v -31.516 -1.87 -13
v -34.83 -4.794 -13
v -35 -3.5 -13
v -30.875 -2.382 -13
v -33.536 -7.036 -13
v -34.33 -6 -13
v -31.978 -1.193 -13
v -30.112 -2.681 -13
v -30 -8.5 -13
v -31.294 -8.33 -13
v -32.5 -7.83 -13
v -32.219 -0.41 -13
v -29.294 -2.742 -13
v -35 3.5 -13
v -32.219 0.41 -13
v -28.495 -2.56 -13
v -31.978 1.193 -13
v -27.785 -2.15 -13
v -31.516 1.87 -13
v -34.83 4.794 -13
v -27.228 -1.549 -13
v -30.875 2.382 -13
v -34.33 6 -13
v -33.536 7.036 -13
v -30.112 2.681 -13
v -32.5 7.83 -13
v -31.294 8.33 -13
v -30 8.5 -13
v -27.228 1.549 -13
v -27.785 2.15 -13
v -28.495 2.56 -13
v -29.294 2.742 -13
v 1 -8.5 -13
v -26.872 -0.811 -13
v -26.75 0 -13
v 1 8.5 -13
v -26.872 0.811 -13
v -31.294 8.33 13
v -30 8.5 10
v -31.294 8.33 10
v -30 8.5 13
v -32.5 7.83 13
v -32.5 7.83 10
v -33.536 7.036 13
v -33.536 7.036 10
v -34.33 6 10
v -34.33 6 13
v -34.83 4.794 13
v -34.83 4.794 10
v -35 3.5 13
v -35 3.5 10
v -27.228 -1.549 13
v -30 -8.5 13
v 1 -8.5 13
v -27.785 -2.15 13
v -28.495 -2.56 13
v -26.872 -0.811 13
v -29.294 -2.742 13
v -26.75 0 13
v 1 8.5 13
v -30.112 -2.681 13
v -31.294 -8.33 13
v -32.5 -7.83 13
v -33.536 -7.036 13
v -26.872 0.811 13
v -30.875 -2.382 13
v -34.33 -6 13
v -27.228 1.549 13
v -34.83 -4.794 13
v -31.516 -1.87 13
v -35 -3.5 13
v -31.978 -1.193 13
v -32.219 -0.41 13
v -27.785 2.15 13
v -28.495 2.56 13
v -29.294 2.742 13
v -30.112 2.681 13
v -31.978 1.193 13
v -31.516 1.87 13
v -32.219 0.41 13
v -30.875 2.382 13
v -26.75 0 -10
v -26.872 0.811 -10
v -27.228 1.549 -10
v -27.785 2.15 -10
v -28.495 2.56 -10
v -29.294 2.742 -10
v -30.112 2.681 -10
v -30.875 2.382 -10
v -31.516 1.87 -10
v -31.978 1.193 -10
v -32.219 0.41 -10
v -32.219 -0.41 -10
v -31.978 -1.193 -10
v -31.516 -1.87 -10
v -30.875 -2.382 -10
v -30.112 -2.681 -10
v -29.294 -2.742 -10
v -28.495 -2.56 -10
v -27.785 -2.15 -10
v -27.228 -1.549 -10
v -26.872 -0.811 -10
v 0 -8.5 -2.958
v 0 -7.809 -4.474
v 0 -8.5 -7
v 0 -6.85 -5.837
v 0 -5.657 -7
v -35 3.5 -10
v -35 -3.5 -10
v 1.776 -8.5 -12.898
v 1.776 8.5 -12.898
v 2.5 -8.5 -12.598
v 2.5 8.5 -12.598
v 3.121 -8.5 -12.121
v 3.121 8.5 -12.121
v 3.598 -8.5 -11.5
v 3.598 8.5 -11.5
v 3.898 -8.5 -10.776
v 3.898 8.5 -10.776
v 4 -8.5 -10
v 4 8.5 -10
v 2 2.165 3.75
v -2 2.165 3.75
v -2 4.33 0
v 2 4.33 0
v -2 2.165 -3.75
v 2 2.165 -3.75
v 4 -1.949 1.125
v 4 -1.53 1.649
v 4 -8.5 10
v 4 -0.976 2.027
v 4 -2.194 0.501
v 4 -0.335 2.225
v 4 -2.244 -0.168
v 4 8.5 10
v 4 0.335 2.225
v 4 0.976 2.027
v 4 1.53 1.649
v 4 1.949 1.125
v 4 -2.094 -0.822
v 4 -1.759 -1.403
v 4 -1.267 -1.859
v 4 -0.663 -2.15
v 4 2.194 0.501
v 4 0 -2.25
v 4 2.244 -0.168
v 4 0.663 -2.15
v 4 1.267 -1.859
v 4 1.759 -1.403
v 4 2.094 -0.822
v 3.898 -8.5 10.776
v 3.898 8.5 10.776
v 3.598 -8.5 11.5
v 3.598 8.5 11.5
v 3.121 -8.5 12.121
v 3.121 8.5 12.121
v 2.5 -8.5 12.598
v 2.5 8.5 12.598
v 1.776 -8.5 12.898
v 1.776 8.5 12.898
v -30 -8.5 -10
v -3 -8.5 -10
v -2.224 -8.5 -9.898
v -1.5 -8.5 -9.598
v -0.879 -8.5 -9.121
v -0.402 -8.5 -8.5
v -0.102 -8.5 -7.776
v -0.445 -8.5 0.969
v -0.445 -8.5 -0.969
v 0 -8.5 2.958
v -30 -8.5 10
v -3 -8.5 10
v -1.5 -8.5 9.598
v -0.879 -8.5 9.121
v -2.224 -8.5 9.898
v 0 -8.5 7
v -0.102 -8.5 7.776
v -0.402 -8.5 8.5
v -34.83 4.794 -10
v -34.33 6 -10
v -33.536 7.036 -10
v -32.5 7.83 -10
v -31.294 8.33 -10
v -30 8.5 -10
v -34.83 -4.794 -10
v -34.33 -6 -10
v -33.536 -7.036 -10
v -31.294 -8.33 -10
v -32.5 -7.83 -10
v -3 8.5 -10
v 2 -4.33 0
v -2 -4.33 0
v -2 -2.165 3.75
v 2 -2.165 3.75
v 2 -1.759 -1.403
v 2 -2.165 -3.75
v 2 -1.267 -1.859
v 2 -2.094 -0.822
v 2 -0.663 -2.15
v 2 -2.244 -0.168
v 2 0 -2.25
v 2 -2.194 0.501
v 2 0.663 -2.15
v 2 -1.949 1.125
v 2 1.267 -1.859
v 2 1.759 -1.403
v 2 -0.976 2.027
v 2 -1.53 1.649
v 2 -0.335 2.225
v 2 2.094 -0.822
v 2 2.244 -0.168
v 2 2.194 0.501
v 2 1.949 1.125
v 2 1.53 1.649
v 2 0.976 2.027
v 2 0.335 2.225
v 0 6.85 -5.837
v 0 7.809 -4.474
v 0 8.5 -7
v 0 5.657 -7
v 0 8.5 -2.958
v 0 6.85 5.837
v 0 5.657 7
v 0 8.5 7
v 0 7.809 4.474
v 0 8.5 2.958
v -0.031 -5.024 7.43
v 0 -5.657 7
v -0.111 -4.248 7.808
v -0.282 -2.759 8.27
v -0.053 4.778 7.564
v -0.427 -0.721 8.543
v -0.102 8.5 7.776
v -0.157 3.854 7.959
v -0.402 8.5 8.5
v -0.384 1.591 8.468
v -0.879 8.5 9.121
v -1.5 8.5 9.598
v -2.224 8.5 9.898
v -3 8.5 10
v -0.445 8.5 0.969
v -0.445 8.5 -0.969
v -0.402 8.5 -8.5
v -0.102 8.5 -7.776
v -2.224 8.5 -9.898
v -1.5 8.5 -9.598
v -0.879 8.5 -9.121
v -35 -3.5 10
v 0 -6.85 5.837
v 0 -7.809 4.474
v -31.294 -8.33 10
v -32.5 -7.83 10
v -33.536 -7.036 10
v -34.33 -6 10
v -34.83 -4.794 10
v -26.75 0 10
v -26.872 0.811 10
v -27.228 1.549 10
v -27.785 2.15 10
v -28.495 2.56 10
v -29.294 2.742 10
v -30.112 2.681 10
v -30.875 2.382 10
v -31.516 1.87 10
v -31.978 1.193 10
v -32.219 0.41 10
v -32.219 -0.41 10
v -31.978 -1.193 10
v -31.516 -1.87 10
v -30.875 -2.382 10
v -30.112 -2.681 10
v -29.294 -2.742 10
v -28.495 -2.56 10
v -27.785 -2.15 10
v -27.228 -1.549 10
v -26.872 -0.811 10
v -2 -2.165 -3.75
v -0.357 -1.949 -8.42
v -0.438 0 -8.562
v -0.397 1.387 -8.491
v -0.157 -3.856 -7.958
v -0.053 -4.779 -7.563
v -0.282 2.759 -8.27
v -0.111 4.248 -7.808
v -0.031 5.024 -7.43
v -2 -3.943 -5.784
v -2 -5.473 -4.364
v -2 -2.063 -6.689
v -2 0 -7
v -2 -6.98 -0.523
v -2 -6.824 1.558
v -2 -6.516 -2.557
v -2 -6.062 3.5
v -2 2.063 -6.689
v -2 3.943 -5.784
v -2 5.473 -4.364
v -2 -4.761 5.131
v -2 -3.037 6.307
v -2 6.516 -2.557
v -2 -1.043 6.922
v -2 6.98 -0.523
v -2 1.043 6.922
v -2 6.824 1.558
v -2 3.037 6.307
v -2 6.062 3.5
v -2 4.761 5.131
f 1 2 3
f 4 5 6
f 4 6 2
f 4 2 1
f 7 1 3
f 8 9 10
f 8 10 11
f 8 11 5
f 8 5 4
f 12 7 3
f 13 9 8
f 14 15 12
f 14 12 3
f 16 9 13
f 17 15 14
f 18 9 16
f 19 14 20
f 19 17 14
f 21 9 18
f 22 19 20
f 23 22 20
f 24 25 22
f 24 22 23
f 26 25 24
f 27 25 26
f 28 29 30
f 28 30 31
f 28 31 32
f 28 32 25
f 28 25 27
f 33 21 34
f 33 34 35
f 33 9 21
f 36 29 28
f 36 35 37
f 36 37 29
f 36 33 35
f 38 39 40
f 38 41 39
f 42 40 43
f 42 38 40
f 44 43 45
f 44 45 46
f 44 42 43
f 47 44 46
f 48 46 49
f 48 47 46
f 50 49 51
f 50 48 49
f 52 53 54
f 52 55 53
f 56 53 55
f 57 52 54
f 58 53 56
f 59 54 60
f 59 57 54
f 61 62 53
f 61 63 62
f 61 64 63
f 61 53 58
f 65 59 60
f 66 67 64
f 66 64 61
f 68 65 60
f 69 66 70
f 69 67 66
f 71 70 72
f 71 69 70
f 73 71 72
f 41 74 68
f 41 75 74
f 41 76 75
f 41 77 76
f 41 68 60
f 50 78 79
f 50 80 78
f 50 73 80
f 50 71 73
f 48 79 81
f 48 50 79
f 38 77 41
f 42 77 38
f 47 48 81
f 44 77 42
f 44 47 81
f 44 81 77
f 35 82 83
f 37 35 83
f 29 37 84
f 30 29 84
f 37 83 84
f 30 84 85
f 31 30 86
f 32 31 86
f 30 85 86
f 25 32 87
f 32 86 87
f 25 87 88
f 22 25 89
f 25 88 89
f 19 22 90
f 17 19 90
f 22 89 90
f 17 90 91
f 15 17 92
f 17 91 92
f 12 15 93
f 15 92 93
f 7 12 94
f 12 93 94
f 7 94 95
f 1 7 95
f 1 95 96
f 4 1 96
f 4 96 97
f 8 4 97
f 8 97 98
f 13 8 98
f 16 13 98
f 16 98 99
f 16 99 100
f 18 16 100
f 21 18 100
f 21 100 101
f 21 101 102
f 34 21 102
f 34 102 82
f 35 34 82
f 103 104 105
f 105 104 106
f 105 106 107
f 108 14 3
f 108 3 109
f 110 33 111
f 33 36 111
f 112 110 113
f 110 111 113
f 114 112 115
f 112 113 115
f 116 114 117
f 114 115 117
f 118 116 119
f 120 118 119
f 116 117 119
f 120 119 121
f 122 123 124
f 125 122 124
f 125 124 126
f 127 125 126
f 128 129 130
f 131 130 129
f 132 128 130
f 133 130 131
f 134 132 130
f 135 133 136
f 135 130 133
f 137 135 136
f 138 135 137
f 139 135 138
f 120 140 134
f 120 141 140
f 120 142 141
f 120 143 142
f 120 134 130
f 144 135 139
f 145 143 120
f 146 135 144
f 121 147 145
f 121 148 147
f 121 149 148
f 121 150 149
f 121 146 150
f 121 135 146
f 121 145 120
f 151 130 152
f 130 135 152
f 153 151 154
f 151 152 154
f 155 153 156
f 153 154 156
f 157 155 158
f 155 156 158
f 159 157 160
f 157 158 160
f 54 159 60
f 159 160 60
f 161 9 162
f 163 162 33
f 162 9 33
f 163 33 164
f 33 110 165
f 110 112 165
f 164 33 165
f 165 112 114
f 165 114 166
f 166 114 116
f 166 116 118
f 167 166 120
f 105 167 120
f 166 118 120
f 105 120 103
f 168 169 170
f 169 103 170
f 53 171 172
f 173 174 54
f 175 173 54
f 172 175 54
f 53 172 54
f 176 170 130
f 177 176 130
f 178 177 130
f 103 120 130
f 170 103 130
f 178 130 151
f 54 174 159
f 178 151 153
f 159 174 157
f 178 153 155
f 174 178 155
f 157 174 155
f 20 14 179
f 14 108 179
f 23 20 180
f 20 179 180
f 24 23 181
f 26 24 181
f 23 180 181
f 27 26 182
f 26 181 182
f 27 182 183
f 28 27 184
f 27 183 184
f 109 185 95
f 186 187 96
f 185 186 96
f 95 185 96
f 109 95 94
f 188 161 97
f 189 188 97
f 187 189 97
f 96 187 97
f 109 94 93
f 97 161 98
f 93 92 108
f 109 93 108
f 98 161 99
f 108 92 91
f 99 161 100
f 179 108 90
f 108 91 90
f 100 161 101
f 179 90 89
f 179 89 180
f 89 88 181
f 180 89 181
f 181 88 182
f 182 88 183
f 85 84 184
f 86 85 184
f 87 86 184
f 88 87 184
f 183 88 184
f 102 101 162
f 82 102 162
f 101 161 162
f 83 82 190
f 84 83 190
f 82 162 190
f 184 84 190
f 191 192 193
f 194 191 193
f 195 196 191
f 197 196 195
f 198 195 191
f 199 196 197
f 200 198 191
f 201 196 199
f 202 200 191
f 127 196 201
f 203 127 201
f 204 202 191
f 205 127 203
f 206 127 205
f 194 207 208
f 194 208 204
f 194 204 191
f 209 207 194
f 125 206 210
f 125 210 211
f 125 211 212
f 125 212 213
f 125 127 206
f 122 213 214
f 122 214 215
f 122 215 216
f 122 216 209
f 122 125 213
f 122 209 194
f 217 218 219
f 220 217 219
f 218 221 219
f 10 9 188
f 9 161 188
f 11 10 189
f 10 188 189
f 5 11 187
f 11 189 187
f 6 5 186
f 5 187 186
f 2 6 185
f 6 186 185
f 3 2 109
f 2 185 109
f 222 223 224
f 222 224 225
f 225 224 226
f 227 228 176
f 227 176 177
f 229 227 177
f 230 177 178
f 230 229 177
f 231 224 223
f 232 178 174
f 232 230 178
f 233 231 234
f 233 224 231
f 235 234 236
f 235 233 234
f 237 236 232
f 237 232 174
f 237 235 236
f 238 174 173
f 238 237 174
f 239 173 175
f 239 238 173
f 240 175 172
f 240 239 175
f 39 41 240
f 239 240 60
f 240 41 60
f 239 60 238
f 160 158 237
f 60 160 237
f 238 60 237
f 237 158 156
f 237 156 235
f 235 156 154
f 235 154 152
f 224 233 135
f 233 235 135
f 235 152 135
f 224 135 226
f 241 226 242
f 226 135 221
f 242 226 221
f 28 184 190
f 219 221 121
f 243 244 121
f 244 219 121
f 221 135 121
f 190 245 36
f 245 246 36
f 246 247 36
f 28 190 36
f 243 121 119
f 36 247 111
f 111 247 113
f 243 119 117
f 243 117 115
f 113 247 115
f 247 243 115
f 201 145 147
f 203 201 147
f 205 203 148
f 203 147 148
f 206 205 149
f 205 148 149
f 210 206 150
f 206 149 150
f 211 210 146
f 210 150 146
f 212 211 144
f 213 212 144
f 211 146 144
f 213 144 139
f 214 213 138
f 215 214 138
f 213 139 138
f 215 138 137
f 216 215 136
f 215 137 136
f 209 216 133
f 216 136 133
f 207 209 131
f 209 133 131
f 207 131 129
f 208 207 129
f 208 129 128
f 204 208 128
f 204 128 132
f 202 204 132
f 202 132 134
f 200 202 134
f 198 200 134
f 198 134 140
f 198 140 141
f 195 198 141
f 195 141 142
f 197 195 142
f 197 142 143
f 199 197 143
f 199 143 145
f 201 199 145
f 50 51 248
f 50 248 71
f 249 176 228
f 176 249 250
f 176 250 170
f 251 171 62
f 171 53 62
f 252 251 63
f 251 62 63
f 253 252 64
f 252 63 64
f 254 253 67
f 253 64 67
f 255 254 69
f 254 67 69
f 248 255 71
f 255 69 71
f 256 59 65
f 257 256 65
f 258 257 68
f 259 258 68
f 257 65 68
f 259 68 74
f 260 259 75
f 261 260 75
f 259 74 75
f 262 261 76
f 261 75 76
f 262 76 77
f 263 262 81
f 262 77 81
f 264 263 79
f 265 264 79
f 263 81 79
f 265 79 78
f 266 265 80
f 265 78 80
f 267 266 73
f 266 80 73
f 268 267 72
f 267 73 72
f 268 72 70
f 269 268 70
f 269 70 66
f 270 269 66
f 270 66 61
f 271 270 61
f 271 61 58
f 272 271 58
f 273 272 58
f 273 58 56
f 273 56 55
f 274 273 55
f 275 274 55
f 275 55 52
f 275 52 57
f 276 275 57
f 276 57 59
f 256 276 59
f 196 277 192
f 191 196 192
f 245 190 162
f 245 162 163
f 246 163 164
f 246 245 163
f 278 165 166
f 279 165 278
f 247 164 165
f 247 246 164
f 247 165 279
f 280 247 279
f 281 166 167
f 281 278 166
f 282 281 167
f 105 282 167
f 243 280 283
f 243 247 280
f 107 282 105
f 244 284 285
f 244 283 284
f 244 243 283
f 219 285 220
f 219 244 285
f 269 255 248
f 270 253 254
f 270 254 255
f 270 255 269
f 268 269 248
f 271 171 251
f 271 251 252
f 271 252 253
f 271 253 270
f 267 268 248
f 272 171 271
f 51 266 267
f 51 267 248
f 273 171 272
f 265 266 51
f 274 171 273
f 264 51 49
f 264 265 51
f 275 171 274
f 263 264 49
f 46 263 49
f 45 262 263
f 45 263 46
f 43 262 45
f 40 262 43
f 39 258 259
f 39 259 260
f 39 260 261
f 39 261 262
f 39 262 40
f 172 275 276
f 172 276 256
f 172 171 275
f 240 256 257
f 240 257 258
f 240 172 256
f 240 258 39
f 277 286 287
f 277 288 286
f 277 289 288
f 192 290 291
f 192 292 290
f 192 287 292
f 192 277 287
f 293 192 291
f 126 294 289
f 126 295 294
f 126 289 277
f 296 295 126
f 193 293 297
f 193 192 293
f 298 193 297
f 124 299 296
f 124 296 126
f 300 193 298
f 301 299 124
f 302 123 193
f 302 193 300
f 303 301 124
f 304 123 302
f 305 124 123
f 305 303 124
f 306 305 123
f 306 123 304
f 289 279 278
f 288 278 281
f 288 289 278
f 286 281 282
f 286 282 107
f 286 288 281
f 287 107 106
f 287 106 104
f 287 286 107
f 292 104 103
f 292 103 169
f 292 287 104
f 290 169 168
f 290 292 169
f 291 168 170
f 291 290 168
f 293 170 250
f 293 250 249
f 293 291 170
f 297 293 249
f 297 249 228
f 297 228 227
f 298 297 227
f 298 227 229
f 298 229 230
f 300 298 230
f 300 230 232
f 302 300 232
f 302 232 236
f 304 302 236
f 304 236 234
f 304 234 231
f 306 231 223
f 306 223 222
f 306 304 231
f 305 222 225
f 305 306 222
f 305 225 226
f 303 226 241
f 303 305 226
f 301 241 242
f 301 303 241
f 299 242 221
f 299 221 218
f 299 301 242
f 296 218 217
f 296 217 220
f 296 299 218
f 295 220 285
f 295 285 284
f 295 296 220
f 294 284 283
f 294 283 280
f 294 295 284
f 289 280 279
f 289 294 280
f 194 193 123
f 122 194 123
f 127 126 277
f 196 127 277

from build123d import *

# Parameters (mm, degrees)
SKETCH1_W           = 26
SKETCH1_H           = 17
BOSS_EXTRUDE1_DEPTH = 4
SKETCH2_W           = 3
SKETCH2_H           = 17
BOSS_EXTRUDE2_DEPTH = 35
SKETCH3_R           = 2.75
CUT_EXTRUDE1_DEPTH  = 45.421278685
FILLET1_R           = 3
FILLET2_R           = 5
SKETCH5_R           = 7
BOSS_EXTRUDE3_DEPTH = 2
CUT_EXTRUDE3_REACH  = 43.979
SKETCH7_R           = 2.25
CUT_EXTRUDE4_DEPTH  = 4
CHAMFER1_SIZE       = 2


with BuildPart() as part:
    # Sketch1 → Boss-Extrude1 (new body)
    with BuildSketch(Plane(origin=(0, 0, 0), x_dir=(0, 0, -1), z_dir=(1, 0, 0))):
        Rectangle(SKETCH1_W, SKETCH1_H)
    extrude(amount=BOSS_EXTRUDE1_DEPTH)

    # Sketch2 → Boss-Extrude2 (add)
    with BuildSketch(Plane.ZY):
        with Locations((-11.5, 0)):
            Rectangle(SKETCH2_W, SKETCH2_H)
        with Locations((11.5, 0)):
            Rectangle(SKETCH2_W, SKETCH2_H)
    extrude(amount=BOSS_EXTRUDE2_DEPTH)

    # Sketch3 → Cut-Extrude1 (cut, through all)
    with BuildSketch(Plane.XY.offset(13)):
        with Locations((-29.5, 0)):
            Circle(SKETCH3_R)
    extrude(amount=-CUT_EXTRUDE1_DEPTH, mode=Mode.SUBTRACT)

    # Fillet1
    fillet1_edges = [part.edges().sort_by_distance(p)[0] for p in [
        (4, 0, 13),
        (0, 0, -10),
        (0, 0, 10),
        (4, 0, -13),
    ]]
    fillet(fillet1_edges, radius=FILLET1_R)

    # Fillet2
    fillet2_edges = [part.edges().sort_by_distance(p)[0] for p in [
        (-35, -8.5, -11.5),
        (-35, 8.5, -11.5),
        (-35, 8.5, 11.5),
        (-35, -8.5, 11.5),
    ]]
    fillet(fillet2_edges, radius=FILLET2_R)

    # Sketch5 → Boss-Extrude3 (add)
    with BuildSketch(Plane.ZY):
        Circle(SKETCH5_R)
    extrude(amount=BOSS_EXTRUDE3_DEPTH)

    # Sketch7 → Cut-Extrude3 (cut, up to next)
    with BuildSketch(Plane(origin=(4, 0, 0), x_dir=(0, 0, -1), z_dir=(1, 0, 0)), mode=Mode.PRIVATE) as cut_extrude3_sk1:
        Circle(SKETCH7_R)
    cut_extrude3_tool1 = extrude(cut_extrude3_sk1.sketch, amount=-CUT_EXTRUDE3_REACH, mode=Mode.PRIVATE) & part.part
    add(cut_extrude3_tool1.solids().sort_by_distance((4, 0, 0))[0], mode=Mode.SUBTRACT)

    # Sketch8 → Cut-Extrude4 (cut)
    with BuildSketch(Plane.ZY.offset(2)):
        Polygon((0, 4.330127019), (-3.75, 2.165063509), (-3.75, -2.165063509), (0, -4.330127019), (3.75, -2.165063509), (3.75, 2.165063509), align=None)
    extrude(amount=-CUT_EXTRUDE4_DEPTH, mode=Mode.SUBTRACT)

    # Chamfer1
    # the kernel refuses this chamfer: 2 mm, written as the material it adds along each edge
    with BuildSketch(Plane(origin=(0, 0, 0), x_dir=(0, 0, 1), z_dir=(0, -1, 0))) as chamfer1_piece_1_section:
        Polygon((7 + CHAMFER1_SIZE, 0), (7, CHAMFER1_SIZE), (7, 0), align=None)
    chamfer1_piece_1 = revolve(axis=Axis((0, 0, 0), (-1, 0, 0)), revolution_arc=180, mode=Mode.PRIVATE)
    chamfer1_piece_1 = split(chamfer1_piece_1, bisect_by=Plane(origin=(-0.945270908, 8.5, 0), z_dir=(0, -1, 0)), keep=Keep.TOP, mode=Mode.PRIVATE)
    chamfer1_piece_1 = split(chamfer1_piece_1, bisect_by=Plane(origin=(-2, 8.001839451, 0), z_dir=(1, 0, 0)), keep=Keep.TOP, mode=Mode.PRIVATE)
    add(chamfer1_piece_1)
    with BuildSketch(Plane(origin=(0, 0, 0), x_dir=(0, 0, -1), z_dir=(0, 1, 0))) as chamfer1_piece_2_section:
        Polygon((7 + CHAMFER1_SIZE, 0), (7, CHAMFER1_SIZE), (7, 0), align=None)
    chamfer1_piece_2 = revolve(axis=Axis((0, 0, 0), (-1, 0, 0)), revolution_arc=180, mode=Mode.PRIVATE)
    chamfer1_piece_2 = split(chamfer1_piece_2, bisect_by=Plane(origin=(-0.945270905, -8.5, 0), z_dir=(0, 1, 0)), keep=Keep.TOP, mode=Mode.PRIVATE)
    chamfer1_piece_2 = split(chamfer1_piece_2, bisect_by=Plane(origin=(-2, -8.001839447, 0), z_dir=(1, 0, 0)), keep=Keep.TOP, mode=Mode.PRIVATE)
    add(chamfer1_piece_2)


solid = part.part
